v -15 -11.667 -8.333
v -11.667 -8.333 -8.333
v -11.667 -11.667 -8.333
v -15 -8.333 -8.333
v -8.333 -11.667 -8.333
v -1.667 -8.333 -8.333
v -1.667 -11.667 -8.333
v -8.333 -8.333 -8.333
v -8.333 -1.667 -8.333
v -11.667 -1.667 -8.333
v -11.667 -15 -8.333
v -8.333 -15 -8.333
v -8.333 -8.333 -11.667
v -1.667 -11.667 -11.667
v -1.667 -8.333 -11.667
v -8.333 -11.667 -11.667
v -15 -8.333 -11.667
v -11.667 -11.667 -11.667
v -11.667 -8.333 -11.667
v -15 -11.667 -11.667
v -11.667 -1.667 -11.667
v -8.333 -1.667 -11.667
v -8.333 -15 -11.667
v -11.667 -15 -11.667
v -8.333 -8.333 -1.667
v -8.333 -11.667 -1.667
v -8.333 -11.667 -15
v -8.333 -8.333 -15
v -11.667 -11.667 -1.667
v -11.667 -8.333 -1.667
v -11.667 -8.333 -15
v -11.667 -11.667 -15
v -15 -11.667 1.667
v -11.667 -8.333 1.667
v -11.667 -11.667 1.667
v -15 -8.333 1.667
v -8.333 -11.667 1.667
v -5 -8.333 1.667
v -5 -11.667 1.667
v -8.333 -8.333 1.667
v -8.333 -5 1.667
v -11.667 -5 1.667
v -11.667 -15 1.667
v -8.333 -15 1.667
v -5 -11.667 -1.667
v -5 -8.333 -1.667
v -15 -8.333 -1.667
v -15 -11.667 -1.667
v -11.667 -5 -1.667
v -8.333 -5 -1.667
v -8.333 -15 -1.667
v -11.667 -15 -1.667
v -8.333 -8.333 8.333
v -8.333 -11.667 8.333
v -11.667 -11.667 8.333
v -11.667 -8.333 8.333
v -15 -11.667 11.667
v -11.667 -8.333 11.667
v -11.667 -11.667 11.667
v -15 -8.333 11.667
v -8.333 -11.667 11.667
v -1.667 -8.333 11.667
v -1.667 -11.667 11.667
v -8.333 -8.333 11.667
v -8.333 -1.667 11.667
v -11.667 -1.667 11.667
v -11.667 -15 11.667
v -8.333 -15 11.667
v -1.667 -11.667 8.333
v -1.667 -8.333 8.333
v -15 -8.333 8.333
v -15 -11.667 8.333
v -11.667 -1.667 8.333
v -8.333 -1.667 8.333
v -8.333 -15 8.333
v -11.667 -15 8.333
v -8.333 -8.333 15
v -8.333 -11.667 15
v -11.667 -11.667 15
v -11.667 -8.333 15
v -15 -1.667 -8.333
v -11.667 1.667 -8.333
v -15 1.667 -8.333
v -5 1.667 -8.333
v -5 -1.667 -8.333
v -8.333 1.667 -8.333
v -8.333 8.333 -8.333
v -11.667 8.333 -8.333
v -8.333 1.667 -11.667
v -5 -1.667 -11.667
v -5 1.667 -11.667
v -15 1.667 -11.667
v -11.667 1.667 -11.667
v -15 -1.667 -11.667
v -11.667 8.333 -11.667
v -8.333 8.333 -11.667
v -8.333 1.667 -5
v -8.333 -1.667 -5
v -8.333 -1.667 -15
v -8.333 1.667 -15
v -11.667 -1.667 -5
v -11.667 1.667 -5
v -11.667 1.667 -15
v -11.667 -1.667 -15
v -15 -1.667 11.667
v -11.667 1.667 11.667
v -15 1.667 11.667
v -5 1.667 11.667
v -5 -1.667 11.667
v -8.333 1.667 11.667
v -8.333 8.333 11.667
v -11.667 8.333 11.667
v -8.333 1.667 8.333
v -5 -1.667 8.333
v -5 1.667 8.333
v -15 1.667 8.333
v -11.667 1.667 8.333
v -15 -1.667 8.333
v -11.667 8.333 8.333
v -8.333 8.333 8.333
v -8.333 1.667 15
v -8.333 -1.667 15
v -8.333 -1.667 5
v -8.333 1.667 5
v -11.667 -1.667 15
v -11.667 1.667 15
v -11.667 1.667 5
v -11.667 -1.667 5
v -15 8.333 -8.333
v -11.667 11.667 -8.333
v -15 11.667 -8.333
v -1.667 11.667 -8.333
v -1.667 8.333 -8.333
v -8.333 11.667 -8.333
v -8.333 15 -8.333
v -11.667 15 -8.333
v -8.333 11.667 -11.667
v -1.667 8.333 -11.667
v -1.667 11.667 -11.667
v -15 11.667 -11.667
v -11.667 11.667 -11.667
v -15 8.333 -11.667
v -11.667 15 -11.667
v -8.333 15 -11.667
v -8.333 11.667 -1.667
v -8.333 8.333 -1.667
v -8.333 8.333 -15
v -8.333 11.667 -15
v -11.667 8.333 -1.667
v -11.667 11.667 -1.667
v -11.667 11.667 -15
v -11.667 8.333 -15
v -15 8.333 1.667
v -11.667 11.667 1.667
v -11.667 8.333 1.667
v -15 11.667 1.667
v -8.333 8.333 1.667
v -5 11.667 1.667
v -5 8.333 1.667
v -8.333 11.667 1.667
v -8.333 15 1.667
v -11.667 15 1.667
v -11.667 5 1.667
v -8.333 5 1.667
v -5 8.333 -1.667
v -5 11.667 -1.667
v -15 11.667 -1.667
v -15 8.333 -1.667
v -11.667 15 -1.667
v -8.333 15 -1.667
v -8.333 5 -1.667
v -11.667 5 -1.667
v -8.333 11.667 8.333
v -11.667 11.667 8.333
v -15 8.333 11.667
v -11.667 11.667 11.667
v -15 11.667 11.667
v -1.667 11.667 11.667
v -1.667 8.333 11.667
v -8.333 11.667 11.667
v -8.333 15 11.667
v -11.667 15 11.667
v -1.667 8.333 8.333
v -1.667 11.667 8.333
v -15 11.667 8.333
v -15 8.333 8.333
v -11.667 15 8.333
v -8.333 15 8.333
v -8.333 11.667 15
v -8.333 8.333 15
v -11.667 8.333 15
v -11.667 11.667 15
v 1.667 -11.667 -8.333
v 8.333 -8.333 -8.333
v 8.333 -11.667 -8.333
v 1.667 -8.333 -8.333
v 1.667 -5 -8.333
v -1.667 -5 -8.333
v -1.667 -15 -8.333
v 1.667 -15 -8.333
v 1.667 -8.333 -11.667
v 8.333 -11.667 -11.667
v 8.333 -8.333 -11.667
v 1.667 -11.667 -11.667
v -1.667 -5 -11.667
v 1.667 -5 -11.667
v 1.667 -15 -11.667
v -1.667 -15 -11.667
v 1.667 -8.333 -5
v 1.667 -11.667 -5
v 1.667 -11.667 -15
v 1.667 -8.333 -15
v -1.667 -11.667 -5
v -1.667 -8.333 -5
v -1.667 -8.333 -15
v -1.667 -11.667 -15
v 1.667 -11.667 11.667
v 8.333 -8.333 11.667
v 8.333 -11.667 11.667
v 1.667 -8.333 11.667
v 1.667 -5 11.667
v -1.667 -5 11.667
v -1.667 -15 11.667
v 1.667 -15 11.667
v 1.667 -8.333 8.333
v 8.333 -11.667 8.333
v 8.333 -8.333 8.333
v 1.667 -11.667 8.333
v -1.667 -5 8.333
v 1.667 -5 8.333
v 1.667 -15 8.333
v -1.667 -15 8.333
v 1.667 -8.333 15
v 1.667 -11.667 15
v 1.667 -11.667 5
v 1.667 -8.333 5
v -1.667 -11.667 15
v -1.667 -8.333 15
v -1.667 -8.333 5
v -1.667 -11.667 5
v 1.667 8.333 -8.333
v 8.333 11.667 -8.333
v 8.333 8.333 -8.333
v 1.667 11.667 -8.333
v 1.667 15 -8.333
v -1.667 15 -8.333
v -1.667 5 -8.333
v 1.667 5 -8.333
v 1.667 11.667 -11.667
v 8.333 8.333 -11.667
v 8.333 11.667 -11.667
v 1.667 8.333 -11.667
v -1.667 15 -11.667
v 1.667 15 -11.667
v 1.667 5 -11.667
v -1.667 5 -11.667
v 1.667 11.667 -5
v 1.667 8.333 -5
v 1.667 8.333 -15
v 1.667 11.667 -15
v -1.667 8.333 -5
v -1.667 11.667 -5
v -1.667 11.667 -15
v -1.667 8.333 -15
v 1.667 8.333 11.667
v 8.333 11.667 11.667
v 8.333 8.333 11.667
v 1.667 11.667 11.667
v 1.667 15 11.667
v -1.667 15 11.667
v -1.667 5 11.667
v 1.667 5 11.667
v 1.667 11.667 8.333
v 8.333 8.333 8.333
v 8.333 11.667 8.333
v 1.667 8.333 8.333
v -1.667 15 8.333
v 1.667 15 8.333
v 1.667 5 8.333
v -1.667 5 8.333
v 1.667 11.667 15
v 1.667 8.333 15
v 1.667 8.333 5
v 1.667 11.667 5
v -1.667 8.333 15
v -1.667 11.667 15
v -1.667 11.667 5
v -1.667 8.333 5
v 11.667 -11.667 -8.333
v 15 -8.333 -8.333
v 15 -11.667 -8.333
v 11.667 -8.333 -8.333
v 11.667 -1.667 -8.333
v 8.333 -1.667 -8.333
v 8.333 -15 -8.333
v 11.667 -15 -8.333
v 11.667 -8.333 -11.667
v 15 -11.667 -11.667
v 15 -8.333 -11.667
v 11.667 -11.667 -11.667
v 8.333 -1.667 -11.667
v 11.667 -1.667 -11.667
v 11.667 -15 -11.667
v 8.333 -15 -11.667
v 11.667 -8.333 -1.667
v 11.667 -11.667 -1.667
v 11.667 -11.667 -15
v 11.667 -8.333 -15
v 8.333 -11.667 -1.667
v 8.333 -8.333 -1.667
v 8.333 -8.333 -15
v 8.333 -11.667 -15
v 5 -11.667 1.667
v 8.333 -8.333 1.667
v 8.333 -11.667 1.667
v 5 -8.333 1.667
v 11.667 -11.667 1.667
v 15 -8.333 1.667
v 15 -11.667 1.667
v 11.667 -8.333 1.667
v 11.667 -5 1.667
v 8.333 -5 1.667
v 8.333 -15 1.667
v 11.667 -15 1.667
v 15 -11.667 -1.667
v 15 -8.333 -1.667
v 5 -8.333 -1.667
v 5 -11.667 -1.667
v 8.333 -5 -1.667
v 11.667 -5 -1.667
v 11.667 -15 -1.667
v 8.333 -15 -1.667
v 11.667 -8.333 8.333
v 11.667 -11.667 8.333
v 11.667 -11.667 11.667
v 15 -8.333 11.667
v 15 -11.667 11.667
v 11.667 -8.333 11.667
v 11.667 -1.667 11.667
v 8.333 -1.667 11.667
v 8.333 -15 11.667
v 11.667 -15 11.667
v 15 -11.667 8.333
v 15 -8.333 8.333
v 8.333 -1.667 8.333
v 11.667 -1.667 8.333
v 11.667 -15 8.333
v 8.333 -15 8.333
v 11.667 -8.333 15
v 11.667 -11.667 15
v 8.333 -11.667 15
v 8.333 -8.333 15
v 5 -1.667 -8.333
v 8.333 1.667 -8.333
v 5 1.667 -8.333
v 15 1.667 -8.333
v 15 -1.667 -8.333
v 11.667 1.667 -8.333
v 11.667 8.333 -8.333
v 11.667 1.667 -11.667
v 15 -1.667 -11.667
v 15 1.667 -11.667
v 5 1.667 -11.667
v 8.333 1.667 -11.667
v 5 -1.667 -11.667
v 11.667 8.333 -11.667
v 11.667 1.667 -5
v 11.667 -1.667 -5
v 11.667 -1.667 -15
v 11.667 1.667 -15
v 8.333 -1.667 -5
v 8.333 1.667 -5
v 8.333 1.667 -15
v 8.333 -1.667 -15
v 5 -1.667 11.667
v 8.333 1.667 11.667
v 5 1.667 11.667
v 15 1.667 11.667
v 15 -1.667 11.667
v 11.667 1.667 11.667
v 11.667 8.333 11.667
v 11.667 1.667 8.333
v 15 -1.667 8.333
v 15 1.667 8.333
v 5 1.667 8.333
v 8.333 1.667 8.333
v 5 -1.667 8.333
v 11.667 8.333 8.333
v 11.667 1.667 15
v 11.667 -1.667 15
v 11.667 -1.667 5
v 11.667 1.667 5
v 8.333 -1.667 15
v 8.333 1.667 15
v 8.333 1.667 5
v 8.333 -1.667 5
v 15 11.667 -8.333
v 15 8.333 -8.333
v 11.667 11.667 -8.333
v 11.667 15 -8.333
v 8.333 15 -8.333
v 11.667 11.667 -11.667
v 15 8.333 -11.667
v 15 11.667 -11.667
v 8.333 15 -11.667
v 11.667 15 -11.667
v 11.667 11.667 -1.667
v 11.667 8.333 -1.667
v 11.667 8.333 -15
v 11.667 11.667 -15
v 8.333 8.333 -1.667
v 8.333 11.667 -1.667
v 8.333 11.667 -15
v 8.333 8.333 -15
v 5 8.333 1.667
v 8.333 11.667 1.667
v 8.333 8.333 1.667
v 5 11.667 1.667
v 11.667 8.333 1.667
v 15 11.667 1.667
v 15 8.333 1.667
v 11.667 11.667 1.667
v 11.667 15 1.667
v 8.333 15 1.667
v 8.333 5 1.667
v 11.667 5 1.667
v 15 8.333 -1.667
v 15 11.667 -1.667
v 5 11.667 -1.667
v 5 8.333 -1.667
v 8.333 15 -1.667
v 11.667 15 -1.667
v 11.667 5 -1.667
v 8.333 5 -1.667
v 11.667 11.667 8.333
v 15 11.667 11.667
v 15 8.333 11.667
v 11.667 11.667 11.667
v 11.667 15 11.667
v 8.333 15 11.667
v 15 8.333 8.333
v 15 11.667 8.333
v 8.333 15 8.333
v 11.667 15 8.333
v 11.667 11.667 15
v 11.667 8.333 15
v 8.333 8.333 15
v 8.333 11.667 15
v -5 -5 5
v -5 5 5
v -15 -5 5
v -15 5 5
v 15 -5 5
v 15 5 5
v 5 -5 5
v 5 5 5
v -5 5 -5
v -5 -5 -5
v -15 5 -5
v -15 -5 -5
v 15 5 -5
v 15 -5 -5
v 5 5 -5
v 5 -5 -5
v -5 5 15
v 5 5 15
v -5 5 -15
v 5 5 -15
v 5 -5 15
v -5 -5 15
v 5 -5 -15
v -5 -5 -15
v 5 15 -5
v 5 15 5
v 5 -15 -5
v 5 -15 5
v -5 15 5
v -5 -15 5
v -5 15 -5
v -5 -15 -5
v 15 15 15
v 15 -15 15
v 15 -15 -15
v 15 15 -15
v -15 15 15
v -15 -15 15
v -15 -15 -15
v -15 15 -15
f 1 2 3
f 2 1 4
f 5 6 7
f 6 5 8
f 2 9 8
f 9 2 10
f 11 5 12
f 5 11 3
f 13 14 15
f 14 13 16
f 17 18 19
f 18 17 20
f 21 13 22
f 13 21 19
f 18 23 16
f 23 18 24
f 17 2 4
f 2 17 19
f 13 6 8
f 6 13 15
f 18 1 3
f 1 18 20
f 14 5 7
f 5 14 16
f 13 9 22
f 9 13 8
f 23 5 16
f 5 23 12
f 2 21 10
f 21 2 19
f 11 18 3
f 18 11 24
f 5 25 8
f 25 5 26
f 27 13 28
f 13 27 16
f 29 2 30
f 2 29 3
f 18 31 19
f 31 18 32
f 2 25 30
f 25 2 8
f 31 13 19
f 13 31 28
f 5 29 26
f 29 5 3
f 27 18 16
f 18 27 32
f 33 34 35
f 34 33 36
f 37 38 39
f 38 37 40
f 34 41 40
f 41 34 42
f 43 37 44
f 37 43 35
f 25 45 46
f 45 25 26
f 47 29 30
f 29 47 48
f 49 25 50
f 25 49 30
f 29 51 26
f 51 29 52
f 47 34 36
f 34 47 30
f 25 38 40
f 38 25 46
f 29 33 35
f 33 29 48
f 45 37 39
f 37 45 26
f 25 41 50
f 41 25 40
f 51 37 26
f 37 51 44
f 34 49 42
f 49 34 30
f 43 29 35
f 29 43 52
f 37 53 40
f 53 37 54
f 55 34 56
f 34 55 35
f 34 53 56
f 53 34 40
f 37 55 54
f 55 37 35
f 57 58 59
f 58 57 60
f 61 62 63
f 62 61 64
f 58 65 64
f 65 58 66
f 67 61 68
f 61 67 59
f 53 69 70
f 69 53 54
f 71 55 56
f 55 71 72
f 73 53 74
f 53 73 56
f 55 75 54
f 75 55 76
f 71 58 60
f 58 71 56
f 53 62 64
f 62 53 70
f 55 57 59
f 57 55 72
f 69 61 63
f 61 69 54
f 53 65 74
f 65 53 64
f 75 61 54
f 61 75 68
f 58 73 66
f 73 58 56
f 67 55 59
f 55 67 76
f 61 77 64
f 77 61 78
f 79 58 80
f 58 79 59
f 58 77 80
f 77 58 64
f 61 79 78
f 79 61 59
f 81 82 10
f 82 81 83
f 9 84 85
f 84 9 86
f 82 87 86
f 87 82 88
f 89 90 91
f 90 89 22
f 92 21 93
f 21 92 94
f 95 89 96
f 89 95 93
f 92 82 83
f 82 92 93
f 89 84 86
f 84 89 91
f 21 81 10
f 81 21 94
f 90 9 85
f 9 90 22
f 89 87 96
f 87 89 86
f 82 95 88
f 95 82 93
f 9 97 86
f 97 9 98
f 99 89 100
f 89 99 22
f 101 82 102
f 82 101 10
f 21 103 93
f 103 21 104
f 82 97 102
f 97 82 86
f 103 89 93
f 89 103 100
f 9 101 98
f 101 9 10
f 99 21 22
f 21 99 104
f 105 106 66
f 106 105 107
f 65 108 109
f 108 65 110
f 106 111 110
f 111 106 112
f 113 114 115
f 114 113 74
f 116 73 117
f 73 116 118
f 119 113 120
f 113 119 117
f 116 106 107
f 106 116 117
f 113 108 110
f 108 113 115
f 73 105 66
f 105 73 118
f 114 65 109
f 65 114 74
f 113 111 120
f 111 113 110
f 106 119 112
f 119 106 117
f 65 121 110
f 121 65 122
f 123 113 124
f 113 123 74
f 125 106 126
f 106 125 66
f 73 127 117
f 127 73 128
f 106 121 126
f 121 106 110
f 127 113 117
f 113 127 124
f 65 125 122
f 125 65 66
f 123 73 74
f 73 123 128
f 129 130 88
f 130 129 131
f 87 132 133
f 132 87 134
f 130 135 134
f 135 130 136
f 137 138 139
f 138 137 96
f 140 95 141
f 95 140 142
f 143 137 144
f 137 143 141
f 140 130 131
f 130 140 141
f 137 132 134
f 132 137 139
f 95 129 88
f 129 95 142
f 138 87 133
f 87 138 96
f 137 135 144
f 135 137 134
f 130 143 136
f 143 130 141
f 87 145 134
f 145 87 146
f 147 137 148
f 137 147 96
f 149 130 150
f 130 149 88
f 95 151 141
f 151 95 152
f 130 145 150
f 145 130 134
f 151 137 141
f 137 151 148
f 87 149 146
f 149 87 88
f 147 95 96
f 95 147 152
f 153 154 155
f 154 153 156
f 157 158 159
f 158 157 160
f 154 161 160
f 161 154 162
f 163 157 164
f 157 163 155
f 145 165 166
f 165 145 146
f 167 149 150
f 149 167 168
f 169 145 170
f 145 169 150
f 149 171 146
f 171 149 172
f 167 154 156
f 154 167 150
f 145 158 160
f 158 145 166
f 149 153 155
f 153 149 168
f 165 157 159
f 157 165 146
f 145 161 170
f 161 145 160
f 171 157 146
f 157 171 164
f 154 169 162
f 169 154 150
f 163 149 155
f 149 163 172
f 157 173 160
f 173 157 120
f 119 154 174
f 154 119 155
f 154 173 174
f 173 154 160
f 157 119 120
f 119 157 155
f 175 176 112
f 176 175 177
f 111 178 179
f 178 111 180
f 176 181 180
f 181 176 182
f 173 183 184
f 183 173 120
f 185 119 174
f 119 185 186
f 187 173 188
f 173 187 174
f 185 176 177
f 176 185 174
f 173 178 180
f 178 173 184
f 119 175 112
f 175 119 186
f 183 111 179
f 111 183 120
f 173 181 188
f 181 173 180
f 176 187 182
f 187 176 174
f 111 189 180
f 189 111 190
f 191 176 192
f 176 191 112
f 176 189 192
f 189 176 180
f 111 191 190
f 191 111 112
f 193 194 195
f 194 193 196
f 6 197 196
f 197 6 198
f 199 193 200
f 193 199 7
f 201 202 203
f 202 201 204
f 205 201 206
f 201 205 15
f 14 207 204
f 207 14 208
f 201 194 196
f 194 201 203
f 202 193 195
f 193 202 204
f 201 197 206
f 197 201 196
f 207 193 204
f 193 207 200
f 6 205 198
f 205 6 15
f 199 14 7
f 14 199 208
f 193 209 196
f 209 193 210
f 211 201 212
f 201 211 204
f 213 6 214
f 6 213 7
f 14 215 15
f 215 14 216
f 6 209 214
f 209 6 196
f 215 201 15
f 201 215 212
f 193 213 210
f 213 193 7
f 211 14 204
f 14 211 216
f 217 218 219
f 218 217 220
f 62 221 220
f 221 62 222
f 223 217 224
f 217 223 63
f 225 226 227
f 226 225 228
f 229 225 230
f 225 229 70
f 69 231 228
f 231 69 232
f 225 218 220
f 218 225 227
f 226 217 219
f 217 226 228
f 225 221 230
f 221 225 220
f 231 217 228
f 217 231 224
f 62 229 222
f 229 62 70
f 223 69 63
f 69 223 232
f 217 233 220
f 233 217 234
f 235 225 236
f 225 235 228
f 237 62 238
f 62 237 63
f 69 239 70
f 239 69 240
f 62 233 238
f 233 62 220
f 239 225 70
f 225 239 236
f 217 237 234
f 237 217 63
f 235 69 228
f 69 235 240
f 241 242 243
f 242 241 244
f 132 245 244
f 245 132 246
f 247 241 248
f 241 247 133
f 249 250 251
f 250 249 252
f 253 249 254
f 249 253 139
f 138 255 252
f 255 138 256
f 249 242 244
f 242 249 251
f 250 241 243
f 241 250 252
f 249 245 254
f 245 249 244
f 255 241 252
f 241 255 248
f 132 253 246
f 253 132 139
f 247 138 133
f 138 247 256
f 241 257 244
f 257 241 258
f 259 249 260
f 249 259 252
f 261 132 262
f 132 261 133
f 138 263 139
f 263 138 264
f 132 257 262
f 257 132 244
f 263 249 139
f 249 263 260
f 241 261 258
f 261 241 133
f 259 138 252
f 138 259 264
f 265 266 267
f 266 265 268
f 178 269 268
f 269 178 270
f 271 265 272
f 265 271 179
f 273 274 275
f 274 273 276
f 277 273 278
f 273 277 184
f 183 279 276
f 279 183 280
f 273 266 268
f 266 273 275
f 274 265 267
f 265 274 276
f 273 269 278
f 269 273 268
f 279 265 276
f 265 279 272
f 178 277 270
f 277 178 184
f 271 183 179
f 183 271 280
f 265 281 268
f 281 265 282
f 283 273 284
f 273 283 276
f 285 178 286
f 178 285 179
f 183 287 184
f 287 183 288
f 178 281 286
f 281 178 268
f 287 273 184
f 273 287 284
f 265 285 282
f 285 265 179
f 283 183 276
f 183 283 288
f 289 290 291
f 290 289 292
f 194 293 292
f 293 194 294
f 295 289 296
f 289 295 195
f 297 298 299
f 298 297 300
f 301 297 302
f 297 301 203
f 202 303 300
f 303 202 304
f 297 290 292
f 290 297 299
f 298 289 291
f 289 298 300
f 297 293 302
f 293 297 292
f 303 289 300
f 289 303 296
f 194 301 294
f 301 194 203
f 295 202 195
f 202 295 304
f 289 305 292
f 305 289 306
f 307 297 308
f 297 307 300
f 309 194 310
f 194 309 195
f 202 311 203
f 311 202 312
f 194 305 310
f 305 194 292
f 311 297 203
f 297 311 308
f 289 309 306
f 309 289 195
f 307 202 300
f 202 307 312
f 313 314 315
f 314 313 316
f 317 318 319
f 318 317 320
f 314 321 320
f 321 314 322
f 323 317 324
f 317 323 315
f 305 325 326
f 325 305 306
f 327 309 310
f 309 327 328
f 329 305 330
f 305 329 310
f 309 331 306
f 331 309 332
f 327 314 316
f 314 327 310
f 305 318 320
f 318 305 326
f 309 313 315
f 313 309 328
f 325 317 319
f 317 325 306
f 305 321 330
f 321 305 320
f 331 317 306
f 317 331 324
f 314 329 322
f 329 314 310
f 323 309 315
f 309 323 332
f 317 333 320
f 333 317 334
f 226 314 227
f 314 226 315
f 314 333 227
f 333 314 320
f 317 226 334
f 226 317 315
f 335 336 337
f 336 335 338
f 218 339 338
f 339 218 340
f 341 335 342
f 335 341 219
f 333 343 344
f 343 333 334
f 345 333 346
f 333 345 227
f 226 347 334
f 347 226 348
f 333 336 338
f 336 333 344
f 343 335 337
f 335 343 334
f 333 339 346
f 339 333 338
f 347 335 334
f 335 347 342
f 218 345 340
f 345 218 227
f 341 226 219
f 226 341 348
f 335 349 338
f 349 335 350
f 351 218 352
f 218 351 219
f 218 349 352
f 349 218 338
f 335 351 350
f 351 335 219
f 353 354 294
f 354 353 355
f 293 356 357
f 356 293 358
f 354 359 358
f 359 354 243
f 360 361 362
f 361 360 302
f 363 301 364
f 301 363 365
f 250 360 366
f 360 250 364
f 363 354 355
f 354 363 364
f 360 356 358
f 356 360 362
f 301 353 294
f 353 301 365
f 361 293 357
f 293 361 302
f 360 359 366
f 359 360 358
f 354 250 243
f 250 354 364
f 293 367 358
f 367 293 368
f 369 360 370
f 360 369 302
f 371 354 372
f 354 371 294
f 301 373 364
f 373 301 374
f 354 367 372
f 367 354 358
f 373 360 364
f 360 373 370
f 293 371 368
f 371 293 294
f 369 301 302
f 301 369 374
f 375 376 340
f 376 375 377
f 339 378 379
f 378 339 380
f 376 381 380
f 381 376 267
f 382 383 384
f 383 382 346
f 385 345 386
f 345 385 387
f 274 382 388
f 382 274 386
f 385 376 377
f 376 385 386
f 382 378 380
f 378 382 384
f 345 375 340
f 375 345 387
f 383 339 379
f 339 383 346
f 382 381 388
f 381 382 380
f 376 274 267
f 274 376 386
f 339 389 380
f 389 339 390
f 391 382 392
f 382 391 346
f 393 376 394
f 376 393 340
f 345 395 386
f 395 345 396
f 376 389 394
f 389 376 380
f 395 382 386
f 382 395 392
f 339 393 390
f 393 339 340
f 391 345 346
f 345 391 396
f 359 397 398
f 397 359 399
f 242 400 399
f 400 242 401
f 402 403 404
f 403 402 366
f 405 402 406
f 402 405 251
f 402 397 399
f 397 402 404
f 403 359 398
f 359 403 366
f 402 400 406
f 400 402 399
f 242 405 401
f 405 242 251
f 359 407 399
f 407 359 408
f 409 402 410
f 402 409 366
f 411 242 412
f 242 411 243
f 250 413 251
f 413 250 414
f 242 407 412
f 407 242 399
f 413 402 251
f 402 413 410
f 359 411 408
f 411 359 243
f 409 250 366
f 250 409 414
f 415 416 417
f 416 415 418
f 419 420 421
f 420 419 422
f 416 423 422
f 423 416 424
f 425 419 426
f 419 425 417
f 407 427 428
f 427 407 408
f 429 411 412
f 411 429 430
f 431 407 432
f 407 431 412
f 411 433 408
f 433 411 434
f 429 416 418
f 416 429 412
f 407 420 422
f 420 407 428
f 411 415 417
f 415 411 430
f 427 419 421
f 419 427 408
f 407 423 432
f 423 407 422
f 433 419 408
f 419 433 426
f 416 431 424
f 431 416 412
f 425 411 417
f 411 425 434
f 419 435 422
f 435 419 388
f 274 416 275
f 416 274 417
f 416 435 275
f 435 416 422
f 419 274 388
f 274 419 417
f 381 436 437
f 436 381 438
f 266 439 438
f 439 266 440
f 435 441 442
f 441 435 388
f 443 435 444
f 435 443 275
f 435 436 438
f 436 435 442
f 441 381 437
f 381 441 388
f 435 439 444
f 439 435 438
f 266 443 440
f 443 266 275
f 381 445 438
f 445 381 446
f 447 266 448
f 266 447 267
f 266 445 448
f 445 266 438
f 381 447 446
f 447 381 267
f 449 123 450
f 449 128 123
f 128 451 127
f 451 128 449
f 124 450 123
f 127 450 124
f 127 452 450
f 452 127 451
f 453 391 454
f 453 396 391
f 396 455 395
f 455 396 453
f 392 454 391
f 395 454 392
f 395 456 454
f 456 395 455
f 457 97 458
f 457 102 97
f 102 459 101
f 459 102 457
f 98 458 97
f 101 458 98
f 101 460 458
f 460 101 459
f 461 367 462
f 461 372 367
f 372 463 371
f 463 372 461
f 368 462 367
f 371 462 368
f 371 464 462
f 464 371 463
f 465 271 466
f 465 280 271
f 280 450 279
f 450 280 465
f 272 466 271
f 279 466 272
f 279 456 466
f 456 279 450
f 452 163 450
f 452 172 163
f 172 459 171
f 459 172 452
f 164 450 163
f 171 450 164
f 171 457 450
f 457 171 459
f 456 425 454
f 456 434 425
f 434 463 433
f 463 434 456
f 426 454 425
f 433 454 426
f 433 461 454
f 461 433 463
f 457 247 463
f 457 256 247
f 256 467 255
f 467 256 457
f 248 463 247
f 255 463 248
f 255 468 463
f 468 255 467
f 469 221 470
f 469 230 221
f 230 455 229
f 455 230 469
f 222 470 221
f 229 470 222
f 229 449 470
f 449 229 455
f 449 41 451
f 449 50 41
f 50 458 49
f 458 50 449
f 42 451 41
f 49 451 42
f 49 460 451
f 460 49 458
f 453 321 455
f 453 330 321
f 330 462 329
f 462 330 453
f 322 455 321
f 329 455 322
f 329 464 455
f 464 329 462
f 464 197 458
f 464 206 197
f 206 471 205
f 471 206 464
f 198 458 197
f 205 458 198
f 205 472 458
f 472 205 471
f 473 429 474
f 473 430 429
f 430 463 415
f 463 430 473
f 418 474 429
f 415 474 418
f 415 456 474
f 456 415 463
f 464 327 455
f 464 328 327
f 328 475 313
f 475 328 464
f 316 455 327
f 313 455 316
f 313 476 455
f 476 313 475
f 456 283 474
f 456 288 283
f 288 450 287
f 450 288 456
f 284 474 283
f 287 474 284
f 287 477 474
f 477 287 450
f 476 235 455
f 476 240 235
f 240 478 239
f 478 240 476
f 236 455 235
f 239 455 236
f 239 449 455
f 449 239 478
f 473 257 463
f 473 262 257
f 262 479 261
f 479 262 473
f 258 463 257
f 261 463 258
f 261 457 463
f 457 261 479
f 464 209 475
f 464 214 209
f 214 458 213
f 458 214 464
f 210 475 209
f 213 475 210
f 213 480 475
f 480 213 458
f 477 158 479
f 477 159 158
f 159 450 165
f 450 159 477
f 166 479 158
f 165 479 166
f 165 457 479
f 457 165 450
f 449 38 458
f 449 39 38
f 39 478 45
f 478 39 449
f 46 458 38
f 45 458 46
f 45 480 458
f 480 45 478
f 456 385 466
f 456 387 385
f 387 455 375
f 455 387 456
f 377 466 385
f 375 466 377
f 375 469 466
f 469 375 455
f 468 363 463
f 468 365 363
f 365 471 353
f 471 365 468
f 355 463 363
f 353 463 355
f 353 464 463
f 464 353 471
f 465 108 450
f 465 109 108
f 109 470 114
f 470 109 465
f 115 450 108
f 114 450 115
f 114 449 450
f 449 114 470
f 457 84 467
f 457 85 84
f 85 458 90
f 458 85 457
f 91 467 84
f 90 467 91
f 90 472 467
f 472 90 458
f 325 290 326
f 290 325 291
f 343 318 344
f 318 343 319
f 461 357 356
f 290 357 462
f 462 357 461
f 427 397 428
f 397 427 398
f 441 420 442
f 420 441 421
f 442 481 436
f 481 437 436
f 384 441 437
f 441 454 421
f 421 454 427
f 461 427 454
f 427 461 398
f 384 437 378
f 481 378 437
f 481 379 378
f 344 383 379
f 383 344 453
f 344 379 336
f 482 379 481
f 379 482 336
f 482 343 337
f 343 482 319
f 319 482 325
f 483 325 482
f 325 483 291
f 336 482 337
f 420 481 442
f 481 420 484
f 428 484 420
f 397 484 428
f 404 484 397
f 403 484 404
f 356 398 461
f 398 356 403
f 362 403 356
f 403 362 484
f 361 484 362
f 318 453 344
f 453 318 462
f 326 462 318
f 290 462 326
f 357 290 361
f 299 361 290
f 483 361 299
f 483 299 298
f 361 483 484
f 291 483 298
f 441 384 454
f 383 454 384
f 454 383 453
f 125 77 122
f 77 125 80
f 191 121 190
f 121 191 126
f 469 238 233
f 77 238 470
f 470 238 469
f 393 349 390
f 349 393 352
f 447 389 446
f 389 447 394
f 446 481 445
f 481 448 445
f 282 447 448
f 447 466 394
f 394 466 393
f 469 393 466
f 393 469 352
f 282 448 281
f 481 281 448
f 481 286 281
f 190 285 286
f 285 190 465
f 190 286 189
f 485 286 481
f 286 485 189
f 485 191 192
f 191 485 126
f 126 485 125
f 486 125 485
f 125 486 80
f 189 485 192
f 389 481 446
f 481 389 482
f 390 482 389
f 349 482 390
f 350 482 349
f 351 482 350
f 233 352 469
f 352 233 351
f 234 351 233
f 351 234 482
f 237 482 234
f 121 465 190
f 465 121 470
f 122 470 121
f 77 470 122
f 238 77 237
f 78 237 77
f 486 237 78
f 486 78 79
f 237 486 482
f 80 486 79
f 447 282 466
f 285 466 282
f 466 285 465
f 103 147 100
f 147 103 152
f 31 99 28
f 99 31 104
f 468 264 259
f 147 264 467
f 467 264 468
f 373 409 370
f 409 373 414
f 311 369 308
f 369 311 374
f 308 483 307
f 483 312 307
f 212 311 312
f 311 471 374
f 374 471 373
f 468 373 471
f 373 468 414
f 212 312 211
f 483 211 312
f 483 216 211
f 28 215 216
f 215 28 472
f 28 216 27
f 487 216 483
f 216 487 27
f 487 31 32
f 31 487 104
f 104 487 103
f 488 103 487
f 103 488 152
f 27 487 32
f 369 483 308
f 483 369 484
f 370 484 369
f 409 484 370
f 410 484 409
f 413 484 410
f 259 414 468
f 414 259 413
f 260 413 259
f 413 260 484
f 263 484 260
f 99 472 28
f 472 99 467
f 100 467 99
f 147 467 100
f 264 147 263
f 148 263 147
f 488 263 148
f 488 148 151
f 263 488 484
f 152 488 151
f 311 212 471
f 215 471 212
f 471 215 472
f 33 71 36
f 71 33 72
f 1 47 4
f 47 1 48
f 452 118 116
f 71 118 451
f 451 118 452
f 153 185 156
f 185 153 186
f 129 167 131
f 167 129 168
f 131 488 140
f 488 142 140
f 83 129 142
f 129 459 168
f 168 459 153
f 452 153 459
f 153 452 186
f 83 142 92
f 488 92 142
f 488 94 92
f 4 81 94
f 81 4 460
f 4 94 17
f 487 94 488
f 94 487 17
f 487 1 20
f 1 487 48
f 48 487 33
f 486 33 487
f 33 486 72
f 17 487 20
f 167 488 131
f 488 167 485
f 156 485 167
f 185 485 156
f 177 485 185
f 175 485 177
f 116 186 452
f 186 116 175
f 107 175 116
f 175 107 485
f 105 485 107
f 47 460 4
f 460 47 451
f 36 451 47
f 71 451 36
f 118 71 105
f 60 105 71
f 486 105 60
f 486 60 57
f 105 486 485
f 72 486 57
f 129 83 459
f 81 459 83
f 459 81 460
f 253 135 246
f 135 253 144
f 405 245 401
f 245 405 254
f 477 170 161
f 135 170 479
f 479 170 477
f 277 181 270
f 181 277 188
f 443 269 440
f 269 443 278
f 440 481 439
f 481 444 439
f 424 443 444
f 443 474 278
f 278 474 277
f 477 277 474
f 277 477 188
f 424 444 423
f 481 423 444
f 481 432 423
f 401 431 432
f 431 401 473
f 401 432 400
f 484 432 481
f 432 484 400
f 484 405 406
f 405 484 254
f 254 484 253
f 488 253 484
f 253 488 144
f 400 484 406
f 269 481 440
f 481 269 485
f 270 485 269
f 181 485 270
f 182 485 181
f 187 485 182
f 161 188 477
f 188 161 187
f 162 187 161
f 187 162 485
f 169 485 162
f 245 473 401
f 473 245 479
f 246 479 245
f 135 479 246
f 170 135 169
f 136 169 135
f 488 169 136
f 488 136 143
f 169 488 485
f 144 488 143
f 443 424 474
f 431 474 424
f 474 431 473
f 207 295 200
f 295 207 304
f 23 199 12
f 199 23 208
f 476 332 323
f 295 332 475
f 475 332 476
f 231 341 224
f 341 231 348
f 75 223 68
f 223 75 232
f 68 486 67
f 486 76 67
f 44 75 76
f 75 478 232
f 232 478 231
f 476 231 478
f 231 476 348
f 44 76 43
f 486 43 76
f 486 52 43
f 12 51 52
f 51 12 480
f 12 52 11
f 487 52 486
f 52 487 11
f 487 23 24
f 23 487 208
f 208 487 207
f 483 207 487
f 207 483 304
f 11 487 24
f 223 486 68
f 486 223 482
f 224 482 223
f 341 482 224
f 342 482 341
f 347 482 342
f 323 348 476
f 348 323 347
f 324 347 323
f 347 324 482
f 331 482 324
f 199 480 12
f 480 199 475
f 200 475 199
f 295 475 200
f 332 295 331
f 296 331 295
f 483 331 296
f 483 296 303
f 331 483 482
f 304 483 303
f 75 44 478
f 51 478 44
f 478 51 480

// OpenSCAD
// Menger sponge fractal — subtractive: cube minus cross-holes at each level
// NOTE: F5 preview may fail at higher levels due to CSG normalization explosion.
// Use the additive version (menger_sponge.scad) for standard OpenSCAD preview.

level = 2;

module menger_holes(s, lvl) {
  if (lvl > 0) {
    t = s / 3;
    // Cross-shaped holes: 3 axis-aligned beams through center
    cube([s + 0.1, t, t], center=true);
    cube([t, s + 0.1, t], center=true);
    cube([t, t, s + 0.1], center=true);

    // Recurse into 20 surviving sub-cube positions
    for (x = [-1, 0, 1])
      for (y = [-1, 0, 1])
        for (z = [-1, 0, 1])
          if ((x == 0 ? 0 : 1) + (y == 0 ? 0 : 1) + (z == 0 ? 0 : 1) >= 2)
            translate([x*t, y*t, z*t])
              menger_holes(t, lvl - 1);
  }
}

color("goldenrod")
difference() {
  cube(30, center=true);
  menger_holes(30, level);
}
